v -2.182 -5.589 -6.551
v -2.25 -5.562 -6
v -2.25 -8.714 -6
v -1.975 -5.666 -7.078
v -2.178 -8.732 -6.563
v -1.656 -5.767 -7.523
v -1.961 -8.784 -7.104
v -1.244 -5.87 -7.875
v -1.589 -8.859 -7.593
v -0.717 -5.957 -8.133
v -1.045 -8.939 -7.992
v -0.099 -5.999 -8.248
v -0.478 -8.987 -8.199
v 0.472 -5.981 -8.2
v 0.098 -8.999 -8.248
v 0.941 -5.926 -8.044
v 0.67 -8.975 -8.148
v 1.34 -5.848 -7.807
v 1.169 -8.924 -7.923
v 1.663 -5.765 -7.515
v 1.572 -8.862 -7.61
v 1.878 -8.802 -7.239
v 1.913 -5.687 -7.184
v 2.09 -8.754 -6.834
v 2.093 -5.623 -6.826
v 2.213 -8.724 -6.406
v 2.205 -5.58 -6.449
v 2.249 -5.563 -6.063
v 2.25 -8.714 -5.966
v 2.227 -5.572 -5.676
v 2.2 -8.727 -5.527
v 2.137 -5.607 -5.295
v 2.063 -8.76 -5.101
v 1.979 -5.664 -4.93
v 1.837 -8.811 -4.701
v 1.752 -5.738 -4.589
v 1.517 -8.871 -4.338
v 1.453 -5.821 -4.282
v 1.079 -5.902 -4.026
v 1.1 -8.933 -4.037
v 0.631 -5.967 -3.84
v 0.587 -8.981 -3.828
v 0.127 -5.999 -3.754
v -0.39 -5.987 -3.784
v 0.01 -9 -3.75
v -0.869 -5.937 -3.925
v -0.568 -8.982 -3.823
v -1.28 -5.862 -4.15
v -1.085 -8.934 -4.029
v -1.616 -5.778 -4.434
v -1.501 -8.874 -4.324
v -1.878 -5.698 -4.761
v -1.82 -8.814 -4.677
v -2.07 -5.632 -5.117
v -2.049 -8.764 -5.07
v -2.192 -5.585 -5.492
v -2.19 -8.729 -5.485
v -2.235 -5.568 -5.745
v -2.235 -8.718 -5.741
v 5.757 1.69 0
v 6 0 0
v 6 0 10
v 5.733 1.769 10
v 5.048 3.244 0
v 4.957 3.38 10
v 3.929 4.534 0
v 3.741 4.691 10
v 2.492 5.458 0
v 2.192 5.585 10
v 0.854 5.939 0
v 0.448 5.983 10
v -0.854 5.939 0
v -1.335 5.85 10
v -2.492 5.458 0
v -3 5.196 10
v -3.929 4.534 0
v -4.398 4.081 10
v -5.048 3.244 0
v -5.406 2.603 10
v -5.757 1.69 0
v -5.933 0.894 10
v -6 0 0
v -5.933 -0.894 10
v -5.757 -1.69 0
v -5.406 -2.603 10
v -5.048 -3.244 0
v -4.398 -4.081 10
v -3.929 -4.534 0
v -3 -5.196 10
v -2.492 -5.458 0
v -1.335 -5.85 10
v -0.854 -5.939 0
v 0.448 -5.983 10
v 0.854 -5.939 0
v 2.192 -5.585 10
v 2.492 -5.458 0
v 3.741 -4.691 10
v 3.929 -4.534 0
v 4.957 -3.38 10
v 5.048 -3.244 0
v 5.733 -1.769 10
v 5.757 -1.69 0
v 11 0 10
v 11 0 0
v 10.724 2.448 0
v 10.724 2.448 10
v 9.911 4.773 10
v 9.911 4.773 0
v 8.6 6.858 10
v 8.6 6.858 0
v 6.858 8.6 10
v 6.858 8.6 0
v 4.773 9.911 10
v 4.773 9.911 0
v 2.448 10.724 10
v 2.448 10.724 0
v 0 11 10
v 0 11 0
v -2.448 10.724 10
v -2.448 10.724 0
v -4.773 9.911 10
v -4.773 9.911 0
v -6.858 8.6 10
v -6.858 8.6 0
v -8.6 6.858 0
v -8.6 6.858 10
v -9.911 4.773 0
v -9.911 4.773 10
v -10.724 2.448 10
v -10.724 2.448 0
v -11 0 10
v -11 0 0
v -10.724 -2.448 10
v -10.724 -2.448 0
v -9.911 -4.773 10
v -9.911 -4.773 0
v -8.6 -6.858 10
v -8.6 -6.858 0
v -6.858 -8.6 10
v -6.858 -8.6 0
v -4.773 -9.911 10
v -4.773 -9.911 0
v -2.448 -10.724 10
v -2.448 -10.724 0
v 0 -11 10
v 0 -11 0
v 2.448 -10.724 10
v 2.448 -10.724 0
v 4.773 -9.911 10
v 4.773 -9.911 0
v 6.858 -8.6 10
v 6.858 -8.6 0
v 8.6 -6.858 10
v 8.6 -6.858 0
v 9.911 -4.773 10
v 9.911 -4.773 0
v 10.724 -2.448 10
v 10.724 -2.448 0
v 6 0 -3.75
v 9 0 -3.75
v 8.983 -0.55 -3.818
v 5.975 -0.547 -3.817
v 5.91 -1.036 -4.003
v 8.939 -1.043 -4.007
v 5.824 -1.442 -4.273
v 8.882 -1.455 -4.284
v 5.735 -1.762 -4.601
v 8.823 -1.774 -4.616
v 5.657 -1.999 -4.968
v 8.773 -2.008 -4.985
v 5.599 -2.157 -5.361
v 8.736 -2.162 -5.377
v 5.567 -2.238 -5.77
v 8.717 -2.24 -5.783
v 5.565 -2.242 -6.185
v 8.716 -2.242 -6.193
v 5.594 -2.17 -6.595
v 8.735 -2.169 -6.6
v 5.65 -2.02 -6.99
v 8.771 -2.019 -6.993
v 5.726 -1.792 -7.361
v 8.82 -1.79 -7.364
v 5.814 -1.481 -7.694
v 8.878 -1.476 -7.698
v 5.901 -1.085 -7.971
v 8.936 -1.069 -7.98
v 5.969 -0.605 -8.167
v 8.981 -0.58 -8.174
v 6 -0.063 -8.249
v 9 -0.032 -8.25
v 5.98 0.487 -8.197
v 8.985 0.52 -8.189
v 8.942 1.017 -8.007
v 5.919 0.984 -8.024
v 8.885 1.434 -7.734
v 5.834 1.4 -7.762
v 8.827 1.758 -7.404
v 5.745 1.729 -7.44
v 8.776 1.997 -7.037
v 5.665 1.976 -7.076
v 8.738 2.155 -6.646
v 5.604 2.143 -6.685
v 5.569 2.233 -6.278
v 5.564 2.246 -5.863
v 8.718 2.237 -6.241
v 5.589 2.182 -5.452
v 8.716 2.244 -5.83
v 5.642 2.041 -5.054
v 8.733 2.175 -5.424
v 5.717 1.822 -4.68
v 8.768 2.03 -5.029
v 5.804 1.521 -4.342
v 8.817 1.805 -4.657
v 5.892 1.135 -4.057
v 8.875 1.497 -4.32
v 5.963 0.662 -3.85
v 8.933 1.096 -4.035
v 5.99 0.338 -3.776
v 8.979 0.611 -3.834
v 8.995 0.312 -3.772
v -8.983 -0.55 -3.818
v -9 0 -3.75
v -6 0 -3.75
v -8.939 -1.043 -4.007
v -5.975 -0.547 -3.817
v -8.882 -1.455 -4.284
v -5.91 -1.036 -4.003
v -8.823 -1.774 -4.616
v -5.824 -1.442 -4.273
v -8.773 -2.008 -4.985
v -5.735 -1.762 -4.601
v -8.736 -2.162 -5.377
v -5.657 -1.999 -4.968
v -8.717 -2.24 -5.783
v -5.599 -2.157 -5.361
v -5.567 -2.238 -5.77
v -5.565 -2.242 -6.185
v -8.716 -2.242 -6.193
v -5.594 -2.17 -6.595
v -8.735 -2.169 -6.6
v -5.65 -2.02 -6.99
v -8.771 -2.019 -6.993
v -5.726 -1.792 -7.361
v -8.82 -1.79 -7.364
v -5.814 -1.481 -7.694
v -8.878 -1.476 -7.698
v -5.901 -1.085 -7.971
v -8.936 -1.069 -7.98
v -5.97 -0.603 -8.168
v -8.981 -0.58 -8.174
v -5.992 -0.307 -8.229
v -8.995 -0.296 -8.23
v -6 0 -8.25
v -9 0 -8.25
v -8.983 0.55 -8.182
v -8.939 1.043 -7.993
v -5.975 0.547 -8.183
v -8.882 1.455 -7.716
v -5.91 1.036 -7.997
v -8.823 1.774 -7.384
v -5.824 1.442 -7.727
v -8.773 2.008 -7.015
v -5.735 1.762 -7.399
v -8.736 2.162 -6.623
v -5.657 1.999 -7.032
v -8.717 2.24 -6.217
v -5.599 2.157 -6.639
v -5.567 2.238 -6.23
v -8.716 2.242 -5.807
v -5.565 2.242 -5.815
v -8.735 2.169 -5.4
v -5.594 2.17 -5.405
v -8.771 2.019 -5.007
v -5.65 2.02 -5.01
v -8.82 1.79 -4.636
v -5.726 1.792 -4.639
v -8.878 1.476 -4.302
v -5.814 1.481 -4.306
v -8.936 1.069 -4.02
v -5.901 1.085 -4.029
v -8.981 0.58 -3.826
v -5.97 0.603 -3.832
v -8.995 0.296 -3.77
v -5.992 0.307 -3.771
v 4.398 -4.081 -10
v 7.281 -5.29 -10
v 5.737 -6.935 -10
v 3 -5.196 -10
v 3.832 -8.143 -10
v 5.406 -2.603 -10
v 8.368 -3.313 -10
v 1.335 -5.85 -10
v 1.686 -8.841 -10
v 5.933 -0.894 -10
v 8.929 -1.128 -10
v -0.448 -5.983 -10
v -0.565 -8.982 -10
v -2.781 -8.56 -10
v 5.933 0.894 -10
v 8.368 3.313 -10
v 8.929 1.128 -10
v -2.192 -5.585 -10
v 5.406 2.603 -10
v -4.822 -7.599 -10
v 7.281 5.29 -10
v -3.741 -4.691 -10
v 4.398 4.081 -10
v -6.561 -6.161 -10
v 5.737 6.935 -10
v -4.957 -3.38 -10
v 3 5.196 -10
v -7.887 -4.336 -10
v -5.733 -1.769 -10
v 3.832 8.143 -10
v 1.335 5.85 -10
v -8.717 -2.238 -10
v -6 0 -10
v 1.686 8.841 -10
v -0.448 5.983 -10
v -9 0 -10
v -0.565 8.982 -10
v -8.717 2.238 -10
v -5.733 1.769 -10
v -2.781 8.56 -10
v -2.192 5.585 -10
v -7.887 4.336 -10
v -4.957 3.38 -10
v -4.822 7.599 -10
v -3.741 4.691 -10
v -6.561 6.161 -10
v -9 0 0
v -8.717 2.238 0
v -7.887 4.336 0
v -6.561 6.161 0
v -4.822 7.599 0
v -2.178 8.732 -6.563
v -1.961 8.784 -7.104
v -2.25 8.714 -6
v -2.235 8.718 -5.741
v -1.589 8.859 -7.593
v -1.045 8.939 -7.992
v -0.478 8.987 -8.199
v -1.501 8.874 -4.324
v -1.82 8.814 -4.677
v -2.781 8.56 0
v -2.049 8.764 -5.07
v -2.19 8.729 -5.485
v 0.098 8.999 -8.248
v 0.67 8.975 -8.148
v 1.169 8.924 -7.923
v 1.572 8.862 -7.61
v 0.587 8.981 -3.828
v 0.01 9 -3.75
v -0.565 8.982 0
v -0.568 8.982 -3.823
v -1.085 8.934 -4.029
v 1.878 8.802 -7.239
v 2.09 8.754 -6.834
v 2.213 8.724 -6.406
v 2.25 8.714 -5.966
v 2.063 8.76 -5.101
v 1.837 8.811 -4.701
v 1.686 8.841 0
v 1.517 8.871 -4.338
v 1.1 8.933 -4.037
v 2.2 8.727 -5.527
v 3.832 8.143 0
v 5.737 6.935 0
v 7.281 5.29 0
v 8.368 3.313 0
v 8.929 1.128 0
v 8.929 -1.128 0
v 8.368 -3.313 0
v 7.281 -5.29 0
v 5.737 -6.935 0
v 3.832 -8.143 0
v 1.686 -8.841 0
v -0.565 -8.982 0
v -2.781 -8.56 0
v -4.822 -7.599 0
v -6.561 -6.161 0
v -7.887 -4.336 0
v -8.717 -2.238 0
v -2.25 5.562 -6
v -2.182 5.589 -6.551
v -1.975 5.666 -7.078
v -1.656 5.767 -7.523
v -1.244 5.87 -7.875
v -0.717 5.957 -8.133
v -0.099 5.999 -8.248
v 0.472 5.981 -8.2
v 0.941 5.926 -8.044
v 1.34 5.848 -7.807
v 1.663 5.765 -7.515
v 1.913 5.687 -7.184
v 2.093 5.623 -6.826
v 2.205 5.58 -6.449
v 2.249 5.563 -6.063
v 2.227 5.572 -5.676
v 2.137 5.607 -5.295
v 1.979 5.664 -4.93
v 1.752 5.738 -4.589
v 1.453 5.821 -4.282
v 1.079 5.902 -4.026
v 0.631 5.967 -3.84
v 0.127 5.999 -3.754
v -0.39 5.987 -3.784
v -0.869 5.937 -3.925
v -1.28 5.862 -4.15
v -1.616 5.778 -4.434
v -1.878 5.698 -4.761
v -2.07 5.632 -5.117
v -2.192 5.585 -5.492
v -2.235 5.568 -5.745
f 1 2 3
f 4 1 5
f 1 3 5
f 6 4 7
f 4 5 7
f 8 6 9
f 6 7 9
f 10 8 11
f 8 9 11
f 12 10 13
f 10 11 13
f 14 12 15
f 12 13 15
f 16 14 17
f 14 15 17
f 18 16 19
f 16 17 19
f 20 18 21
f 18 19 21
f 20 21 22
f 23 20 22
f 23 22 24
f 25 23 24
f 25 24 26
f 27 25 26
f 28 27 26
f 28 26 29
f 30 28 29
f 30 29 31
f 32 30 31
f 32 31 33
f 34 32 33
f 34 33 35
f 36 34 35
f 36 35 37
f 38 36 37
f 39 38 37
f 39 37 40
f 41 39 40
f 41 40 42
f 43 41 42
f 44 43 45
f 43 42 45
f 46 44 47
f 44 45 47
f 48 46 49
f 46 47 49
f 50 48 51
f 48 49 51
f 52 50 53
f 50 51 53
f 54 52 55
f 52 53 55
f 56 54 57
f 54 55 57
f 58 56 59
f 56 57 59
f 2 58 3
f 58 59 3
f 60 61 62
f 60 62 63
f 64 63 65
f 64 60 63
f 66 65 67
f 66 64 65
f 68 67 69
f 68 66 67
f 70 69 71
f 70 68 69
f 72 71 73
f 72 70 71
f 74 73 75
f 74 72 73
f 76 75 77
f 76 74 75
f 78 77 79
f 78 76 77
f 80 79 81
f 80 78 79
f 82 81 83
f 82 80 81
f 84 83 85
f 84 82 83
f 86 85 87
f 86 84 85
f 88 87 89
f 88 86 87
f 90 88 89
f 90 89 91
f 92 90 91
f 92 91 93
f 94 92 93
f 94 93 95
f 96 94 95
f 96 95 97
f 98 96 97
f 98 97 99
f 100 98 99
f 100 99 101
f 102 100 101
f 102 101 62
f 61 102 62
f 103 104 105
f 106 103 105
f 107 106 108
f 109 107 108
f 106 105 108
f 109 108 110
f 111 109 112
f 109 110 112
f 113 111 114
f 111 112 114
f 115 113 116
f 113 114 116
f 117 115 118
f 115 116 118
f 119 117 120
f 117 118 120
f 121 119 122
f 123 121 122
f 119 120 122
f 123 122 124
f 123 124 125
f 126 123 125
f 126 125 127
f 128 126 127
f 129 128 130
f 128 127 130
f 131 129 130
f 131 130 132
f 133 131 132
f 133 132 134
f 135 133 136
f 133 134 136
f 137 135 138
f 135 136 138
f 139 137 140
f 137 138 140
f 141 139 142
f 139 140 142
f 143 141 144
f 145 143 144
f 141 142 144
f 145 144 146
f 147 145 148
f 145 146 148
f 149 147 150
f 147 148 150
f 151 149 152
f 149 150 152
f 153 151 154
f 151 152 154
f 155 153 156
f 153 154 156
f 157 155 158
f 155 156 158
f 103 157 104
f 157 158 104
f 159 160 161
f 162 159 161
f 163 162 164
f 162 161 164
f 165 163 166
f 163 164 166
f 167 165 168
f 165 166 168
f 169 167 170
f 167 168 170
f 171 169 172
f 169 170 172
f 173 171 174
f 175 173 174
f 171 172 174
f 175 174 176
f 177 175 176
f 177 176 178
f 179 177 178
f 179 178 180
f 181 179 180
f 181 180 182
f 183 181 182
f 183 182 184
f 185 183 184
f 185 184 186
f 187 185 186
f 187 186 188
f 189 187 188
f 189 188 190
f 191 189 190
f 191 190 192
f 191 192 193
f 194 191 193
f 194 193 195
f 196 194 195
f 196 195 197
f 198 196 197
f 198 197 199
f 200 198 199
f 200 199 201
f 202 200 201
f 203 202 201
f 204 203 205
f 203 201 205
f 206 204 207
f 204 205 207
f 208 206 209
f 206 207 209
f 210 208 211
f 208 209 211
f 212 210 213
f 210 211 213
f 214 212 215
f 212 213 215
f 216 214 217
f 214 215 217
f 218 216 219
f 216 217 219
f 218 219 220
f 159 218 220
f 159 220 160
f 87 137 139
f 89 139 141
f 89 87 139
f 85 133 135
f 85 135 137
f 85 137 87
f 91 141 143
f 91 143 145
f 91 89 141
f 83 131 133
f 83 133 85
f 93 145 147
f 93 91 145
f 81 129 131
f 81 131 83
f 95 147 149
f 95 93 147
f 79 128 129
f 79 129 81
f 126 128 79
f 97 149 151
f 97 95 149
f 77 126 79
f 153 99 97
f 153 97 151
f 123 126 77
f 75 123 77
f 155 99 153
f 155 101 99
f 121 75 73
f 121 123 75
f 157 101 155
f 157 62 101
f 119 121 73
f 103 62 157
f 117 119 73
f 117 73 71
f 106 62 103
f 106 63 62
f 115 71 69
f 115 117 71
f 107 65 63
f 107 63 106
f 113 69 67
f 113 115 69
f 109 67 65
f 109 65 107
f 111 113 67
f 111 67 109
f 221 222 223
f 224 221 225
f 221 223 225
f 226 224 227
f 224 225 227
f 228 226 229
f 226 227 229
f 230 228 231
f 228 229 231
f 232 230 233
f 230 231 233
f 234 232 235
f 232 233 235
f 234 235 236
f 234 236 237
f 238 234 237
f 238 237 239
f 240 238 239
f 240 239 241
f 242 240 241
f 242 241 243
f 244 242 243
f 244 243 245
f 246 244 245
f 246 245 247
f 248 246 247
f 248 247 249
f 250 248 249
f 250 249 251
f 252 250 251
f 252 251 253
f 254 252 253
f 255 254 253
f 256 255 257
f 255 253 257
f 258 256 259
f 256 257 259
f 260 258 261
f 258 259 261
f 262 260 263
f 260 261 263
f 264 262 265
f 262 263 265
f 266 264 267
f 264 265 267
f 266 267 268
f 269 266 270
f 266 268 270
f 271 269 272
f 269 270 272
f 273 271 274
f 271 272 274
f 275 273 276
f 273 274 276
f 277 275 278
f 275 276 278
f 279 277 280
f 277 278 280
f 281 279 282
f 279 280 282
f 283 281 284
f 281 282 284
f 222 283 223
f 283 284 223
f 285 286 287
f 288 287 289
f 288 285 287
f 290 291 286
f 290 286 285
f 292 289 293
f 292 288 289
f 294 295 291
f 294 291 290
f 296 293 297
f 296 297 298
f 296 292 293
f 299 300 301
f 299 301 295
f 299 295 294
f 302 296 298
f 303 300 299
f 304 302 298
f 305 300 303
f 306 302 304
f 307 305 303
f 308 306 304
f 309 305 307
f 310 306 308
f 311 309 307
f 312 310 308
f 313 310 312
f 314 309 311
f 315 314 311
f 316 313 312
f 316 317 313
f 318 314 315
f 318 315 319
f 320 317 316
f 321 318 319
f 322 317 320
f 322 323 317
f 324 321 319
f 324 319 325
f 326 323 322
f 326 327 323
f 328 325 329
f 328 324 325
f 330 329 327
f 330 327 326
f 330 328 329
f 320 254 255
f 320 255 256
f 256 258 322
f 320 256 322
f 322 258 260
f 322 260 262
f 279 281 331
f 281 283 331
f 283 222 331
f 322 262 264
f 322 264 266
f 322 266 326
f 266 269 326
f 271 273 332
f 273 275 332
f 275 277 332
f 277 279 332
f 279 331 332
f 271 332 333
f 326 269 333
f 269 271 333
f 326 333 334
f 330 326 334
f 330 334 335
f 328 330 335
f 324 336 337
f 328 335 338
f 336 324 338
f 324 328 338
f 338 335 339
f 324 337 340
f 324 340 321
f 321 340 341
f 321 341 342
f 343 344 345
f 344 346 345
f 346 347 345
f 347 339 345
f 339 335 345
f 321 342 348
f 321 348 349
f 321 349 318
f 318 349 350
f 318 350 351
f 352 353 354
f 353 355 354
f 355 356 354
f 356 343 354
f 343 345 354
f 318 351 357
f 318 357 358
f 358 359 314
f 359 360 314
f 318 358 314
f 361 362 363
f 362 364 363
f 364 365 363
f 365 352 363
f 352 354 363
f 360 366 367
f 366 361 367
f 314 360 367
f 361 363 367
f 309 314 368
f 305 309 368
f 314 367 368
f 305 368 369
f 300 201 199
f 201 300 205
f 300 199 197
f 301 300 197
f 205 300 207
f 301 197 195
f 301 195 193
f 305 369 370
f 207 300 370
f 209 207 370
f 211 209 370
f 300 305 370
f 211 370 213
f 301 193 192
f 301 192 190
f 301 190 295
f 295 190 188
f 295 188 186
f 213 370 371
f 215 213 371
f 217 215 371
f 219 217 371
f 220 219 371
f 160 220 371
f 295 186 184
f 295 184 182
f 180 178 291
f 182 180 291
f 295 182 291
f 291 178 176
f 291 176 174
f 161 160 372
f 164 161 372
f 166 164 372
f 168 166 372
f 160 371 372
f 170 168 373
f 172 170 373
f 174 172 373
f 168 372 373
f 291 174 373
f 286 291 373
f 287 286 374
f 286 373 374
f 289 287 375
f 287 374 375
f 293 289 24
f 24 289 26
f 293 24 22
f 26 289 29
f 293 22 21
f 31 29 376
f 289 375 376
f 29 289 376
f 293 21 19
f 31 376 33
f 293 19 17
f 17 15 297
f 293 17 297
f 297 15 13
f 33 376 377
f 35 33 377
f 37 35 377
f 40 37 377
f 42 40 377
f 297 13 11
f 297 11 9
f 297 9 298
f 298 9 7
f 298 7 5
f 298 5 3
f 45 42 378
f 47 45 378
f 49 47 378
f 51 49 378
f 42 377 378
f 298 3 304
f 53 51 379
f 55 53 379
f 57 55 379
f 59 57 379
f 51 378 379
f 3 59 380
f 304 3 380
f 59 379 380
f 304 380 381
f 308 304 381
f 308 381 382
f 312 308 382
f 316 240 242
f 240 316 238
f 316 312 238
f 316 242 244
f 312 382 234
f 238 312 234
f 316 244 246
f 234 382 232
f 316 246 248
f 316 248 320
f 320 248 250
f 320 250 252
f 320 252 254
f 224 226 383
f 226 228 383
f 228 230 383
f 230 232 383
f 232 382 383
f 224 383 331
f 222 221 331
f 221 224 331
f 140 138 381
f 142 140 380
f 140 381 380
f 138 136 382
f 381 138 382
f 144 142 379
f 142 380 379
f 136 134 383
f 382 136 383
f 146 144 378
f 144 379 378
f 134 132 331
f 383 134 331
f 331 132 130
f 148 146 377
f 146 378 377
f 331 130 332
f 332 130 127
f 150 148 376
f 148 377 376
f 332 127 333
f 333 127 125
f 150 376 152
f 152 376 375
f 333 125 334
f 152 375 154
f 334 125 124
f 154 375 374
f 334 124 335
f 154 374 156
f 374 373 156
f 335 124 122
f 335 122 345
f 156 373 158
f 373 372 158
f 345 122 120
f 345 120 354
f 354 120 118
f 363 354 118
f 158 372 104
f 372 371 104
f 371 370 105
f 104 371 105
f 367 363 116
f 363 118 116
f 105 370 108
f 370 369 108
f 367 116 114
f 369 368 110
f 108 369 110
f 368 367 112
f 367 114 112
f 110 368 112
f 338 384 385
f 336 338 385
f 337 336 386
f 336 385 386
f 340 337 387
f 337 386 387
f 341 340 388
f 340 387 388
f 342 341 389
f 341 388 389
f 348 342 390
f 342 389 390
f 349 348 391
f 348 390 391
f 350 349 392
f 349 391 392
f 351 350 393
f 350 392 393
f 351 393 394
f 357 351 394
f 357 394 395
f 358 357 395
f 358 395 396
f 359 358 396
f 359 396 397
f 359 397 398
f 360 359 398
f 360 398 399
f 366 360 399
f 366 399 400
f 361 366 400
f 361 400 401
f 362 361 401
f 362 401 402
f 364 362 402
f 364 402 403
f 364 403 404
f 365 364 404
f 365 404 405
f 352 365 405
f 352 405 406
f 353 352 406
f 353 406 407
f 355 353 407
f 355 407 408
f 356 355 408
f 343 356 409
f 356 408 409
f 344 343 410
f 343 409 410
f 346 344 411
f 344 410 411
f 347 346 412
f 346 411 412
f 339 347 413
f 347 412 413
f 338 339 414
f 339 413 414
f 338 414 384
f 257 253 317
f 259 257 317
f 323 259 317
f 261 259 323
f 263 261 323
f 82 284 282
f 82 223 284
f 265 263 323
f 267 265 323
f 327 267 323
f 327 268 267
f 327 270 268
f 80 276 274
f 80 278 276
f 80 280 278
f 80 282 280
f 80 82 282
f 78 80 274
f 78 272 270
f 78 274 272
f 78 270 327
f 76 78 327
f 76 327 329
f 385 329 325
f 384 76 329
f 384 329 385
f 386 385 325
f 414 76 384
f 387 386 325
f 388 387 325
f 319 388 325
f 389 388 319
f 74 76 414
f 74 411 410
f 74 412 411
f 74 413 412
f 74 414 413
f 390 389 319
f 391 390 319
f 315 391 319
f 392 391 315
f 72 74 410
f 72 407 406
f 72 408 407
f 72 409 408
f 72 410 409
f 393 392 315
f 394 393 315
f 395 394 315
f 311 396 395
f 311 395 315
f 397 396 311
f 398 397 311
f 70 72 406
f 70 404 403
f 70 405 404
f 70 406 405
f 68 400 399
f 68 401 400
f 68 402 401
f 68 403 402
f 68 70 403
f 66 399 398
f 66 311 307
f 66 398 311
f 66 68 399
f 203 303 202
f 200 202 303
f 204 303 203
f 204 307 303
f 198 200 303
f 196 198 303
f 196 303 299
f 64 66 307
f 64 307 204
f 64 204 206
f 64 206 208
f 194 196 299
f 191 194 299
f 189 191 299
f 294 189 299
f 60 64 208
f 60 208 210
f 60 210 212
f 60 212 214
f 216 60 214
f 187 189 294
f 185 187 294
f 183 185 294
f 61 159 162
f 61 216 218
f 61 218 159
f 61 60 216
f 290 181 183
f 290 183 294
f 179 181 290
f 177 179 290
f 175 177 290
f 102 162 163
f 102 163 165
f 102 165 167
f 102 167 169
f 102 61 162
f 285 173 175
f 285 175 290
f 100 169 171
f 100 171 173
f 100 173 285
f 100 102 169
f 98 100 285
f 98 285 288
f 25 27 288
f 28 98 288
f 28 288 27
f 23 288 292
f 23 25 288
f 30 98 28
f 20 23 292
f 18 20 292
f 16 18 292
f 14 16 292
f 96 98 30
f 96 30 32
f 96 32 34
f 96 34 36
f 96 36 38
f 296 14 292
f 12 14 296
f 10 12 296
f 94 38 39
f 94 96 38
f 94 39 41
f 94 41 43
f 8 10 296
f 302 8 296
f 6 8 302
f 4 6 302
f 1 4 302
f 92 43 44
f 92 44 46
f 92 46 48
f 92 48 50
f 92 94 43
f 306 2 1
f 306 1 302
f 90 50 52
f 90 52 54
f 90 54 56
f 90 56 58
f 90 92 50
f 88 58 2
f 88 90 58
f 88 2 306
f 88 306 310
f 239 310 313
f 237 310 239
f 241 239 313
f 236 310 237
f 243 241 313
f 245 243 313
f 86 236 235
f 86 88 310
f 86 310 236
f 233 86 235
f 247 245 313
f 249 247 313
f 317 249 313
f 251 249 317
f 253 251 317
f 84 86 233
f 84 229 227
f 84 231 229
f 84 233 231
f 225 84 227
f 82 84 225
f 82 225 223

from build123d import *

# Parameters (mm, degrees)
ESQUISSE1_R                = 11
ESQUISSE1_R_2              = 6
BOSS_EXTRU_1_DEPTH         = 10
ESQUISSE2_R                = 9
ESQUISSE2_R_2              = 6
BOSS_EXTRU_2_DEPTH         = 10
D_GAGEMENT_M41_D           = 4.5
D_GAGEMENT_M41_ON_FACE_2_D = 4.5


with BuildPart() as part:
    # Esquisse1 → Boss.-Extru.1 (new body)
    with BuildSketch(Plane.XY):
        Circle(ESQUISSE1_R)
        Circle(ESQUISSE1_R_2, mode=Mode.SUBTRACT)
    extrude(amount=BOSS_EXTRU_1_DEPTH)

    # Esquisse2 → Boss.-Extru.2 (add)
    with BuildSketch(Plane(origin=(0, 0, 0), x_dir=(-1, 0, 0), z_dir=(0, 0, -1))):
        Circle(ESQUISSE2_R)
        Circle(ESQUISSE2_R_2, mode=Mode.SUBTRACT)
    extrude(amount=BOSS_EXTRU_2_DEPTH)

    # Dégagement M41 (through all)
    with Locations(Plane(origin=(0, 9, -6), x_dir=(1, 0, 0), z_dir=(0, 1, 0))):
        with Locations((0, 0)):
            Hole(D_GAGEMENT_M41_D / 2)

    # Dégagement M41 on face 2 (through all)
    with Locations(Plane(origin=(-9, 0, -6), x_dir=(0, 0, -1), z_dir=(-1, 0, 0))):
        with Locations((0, 0)):
            Hole(D_GAGEMENT_M41_ON_FACE_2_D / 2)


solid = part.part
